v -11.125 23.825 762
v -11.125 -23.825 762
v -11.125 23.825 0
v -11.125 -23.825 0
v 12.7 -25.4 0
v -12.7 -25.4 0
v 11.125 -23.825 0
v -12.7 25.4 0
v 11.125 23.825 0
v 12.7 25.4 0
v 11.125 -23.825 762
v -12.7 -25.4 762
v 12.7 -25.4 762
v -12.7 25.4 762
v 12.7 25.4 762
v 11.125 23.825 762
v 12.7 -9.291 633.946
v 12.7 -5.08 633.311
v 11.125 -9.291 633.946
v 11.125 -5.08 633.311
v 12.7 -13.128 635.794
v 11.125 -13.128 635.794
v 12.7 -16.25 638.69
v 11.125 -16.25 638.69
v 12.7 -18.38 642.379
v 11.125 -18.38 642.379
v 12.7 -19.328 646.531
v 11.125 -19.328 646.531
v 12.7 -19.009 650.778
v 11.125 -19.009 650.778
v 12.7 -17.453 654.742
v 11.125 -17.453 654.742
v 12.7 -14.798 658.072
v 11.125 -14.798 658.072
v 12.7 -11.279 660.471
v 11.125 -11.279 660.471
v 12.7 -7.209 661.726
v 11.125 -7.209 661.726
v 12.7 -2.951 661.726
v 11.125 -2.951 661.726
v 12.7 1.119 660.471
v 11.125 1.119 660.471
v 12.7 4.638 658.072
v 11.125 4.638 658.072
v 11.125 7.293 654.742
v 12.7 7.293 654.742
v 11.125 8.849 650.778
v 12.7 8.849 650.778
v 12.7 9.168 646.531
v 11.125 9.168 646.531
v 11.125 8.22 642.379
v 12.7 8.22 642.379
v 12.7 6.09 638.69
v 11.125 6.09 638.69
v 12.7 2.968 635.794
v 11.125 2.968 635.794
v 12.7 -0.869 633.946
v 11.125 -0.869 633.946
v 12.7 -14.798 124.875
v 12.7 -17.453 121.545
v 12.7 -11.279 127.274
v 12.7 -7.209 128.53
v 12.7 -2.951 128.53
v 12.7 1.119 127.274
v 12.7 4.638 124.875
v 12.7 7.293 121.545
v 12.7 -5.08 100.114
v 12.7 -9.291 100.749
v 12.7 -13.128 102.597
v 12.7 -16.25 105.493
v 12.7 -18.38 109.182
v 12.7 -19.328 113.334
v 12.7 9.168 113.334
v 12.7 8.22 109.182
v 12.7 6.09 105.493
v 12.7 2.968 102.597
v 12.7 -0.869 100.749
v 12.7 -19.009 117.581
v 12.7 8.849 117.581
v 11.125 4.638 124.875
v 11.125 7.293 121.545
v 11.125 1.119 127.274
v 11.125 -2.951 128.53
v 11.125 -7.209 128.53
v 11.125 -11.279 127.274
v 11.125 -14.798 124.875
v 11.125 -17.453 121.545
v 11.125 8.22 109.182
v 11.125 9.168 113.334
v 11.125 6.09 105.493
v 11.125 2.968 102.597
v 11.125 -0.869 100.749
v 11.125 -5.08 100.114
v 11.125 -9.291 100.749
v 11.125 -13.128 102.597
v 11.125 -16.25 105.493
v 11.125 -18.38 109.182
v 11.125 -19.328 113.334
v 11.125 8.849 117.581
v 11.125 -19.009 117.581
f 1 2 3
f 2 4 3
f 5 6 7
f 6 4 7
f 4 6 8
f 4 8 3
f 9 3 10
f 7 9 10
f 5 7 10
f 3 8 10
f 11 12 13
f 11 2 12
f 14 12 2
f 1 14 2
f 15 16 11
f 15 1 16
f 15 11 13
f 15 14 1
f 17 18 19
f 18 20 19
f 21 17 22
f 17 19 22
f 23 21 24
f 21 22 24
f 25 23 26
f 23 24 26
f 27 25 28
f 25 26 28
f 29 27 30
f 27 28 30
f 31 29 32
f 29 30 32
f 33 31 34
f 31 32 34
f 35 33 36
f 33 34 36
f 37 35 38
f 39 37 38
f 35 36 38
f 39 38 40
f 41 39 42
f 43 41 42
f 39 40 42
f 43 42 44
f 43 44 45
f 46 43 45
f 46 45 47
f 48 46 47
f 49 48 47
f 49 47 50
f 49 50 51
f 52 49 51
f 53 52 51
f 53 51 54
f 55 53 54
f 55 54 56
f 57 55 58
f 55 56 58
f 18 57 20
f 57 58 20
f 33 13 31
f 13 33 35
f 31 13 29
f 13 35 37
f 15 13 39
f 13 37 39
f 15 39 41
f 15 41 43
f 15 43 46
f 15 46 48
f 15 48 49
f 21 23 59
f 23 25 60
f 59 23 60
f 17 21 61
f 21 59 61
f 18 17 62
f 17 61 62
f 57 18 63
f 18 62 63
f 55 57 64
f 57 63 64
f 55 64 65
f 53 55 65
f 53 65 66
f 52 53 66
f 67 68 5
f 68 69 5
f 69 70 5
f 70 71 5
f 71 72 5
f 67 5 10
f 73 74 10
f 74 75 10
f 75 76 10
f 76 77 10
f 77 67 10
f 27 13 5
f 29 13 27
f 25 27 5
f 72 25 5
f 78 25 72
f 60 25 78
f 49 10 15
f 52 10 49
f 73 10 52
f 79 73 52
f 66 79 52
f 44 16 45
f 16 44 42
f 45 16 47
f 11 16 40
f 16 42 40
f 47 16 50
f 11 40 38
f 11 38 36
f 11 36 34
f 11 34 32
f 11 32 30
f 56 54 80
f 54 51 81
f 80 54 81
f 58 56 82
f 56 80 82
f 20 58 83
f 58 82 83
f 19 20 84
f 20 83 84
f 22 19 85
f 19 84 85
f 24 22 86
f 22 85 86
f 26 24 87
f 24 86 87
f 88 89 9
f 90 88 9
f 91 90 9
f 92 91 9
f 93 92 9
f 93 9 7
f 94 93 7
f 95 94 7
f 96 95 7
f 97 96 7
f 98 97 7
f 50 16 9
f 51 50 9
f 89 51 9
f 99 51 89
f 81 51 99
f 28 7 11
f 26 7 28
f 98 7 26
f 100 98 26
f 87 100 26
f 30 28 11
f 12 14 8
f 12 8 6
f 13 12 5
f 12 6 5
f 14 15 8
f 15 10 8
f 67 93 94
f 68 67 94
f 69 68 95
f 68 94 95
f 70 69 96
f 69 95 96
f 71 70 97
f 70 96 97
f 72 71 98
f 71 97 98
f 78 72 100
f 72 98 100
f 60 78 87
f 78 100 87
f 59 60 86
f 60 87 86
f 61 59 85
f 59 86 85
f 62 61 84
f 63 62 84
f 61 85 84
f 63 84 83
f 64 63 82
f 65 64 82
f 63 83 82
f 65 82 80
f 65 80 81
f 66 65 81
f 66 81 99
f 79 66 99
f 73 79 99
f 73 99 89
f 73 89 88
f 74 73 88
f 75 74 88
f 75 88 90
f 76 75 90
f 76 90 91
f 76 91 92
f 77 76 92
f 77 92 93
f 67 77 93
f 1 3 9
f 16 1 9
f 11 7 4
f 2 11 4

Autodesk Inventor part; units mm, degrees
ref_plane "YZ Plane" through (0, 0, 0) normal (1, 0, 0) x (0, 1, 0)
ref_plane "XZ Plane" through (0, 0, 0) normal (0, 1, 0) x (-1, 0, 0)
ref_plane "XY Plane" through (0, 0, 0) normal (0, 0, 1) x (1, 0, 0)
sketch "Sketch1" plane through (0, 0, 0) normal (0, 0, 1) x (1, 0, 0)
  line L0 (-12.7, -25.4) -> (12.7, -25.4)
  line L1 (12.7, -25.4) -> (12.7, 25.4)
  line L2 (12.7, 25.4) -> (-12.7, 25.4)
  line L3 (-12.7, 25.4) -> (-12.7, -25.4)
  line L4 (-12.7, -25.4) -> (12.7, 25.4) construction
  line L5 (12.7, -25.4) -> (-12.7, 25.4) construction
  line L6 (-11.1252, 23.8252) -> (11.1252, 23.8252)
  line L7 (11.1252, 23.8252) -> (11.1252, -23.8252)
  line L8 (11.1252, -23.8252) -> (-11.1252, -23.8252)
  line L9 (-11.1252, -23.8252) -> (-11.1252, 23.8252)
  line L10 (-11.1252, 23.8252) -> (11.1252, -23.8252) construction
  line L11 (11.1252, 23.8252) -> (-11.1252, -23.8252) construction
  point P0 (0, 0)
  dimension "d0" = 25.4
  dimension "d1" = 50.8
  dimension "d2" = 22.2504
  dimension "d3" = 47.6504
extrude "Extrusion2" add sketch "Sketch1" along normal blind 762
hole "Hole1" at (12.7, -5.08, 114.4016) direction (-1, 0, 0) diameter 28.575 depth 5.08 tip angle 118
hole "Hole2" at (12.7, -5.08, 647.5984) direction (-1, 0, 0) diameter 28.575 depth 5.08 tip angle 118
properties part number "sides" material "Aluminum 6061"
